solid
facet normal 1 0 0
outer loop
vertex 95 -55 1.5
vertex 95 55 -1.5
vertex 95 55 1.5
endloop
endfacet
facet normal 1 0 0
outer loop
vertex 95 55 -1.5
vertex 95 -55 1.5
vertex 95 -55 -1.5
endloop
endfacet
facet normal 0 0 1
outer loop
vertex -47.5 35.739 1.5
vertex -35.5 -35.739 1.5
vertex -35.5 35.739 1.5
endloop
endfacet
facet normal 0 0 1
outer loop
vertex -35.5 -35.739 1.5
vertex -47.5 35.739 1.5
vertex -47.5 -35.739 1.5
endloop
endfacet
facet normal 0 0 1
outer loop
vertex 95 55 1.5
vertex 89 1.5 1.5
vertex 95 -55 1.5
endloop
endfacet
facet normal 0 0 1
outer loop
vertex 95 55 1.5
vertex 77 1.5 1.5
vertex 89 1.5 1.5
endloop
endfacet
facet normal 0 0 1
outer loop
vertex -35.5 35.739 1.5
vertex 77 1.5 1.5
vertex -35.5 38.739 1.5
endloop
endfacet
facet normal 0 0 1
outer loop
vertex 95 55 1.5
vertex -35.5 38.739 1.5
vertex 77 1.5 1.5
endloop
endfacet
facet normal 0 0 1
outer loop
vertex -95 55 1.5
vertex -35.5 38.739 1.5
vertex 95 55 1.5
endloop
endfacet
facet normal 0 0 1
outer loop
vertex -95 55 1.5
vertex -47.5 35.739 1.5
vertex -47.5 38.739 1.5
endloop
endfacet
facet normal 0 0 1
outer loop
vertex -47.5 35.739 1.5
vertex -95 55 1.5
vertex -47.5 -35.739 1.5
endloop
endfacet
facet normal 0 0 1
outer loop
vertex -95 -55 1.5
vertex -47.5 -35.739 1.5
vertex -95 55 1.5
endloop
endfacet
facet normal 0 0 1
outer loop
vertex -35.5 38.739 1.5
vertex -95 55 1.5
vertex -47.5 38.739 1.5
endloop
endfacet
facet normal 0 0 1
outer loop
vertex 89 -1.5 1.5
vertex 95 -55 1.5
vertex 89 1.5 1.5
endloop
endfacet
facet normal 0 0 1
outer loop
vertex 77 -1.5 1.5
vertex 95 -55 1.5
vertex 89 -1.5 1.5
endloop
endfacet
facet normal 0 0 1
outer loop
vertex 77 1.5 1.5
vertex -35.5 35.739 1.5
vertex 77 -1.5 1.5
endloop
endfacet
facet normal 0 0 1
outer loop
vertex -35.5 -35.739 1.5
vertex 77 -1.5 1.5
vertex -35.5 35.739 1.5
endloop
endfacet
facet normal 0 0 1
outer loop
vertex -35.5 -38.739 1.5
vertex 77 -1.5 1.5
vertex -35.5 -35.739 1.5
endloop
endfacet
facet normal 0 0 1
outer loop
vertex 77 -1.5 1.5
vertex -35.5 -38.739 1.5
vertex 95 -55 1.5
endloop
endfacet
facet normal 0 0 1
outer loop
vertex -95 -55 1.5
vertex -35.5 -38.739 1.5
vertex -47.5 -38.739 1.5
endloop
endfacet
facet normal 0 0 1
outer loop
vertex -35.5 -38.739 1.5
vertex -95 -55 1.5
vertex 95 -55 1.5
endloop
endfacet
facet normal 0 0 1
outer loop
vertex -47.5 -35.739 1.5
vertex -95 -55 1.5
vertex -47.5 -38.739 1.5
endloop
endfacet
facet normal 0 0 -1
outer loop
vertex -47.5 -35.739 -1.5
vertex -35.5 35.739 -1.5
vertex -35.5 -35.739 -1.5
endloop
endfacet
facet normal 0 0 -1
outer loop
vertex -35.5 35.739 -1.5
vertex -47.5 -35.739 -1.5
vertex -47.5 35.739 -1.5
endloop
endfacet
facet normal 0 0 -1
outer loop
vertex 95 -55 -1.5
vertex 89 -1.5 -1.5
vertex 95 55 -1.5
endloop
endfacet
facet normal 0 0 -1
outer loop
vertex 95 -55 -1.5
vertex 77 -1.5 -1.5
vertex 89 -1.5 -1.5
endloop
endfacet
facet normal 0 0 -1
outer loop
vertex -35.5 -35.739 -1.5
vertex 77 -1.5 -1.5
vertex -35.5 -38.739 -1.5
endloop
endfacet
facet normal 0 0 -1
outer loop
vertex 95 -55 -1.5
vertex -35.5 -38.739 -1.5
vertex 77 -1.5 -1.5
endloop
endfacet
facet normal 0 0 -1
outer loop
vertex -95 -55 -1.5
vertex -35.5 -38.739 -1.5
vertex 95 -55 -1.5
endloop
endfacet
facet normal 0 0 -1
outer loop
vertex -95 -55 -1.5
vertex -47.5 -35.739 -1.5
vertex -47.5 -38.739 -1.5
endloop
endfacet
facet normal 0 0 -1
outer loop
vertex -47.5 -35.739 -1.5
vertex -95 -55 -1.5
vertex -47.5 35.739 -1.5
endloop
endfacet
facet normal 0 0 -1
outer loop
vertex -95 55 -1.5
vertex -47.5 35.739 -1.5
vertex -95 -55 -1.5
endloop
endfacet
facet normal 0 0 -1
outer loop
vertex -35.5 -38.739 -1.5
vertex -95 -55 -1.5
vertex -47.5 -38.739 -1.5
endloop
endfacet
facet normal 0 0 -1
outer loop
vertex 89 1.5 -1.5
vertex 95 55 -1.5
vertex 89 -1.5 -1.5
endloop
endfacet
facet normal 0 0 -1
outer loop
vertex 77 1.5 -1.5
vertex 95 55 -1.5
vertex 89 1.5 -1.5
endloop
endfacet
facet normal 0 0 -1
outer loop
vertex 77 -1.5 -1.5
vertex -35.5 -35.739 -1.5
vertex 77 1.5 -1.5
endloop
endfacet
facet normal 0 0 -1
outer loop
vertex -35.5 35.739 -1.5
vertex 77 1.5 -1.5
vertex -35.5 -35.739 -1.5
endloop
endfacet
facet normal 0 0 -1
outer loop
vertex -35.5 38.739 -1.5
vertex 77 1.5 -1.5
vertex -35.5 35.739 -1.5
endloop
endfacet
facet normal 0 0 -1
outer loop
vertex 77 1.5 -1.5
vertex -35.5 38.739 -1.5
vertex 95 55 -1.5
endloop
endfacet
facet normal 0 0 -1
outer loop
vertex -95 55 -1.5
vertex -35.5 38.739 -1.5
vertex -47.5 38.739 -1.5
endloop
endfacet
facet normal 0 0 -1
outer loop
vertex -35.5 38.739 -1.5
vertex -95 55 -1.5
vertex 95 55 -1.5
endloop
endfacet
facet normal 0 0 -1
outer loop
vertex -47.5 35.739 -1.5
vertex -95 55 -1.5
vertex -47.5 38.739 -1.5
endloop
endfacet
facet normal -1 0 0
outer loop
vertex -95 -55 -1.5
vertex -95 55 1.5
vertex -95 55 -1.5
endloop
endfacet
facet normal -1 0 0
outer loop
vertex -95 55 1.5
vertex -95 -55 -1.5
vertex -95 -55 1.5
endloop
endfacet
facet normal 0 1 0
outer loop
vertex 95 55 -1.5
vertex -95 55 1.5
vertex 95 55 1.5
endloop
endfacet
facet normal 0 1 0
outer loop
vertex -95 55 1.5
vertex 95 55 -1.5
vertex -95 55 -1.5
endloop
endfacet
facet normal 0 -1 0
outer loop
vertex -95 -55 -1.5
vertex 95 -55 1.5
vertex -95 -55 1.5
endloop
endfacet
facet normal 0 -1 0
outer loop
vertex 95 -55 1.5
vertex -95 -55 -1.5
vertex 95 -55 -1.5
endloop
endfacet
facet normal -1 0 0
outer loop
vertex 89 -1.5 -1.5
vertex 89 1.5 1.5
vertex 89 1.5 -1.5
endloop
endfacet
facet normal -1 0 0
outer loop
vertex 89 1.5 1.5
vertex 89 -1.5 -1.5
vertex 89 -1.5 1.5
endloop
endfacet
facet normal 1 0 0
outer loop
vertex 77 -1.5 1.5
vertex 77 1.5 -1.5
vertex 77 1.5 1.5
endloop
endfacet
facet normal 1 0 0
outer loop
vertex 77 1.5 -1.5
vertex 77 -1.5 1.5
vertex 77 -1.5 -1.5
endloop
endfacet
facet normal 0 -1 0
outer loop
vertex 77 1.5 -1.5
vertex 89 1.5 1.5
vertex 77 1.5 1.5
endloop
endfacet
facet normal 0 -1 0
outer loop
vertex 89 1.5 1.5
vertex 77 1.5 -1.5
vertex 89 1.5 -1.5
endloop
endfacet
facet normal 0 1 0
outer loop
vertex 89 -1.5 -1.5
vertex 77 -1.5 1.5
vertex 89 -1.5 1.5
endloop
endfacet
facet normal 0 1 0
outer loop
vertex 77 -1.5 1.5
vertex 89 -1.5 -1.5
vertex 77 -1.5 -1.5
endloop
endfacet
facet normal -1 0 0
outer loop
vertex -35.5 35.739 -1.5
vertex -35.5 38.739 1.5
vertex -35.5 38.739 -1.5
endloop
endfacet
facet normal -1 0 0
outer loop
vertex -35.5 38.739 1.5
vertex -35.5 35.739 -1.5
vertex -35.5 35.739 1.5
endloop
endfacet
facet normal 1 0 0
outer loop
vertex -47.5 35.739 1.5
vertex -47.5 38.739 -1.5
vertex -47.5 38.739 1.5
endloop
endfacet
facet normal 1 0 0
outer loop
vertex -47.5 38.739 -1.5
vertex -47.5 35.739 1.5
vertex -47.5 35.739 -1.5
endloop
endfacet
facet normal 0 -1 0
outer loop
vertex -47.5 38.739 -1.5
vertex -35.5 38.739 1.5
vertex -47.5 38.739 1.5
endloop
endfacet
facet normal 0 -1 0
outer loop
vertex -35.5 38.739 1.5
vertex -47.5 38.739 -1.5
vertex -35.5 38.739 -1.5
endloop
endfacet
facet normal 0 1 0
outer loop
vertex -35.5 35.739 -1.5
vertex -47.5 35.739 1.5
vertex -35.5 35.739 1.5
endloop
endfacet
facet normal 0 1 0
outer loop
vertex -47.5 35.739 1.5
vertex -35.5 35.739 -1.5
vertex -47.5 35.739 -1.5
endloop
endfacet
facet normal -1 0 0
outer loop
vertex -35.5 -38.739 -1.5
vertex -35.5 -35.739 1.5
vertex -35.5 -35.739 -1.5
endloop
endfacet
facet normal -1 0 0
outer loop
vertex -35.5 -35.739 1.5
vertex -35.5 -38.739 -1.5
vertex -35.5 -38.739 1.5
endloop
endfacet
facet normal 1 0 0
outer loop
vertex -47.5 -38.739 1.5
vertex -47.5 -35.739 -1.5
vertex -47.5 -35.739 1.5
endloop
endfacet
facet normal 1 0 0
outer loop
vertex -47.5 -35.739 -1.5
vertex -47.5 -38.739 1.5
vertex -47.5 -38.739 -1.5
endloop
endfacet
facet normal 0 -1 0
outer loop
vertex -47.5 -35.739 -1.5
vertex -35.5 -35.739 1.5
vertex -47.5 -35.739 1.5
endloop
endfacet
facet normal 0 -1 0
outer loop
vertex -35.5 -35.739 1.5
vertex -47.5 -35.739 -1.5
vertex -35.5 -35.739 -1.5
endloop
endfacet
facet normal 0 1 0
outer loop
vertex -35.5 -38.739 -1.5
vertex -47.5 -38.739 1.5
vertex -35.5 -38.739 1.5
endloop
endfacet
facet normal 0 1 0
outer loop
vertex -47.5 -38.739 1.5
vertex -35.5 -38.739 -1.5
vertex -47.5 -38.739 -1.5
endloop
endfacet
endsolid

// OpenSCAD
// ========================================
// a 190 x 110 x 3 mm plate with three 12 x 3 mm slots
// NeuroCAD canonical IR; dimensions are millimetres
// ========================================
$fn = 48;

difference() {
  cube(size=[190, 110, 3], center=true);
  translate([83, 0, 0]) {
    cube(size=[12, 3, 5], center=true);
  }
  translate([-41.5, 37.2390923627309, 0]) {
    cube(size=[12, 3, 5], center=true);
  }
  translate([-41.5, -37.2390923627309, 0]) {
    cube(size=[12, 3, 5], center=true);
  }
}
